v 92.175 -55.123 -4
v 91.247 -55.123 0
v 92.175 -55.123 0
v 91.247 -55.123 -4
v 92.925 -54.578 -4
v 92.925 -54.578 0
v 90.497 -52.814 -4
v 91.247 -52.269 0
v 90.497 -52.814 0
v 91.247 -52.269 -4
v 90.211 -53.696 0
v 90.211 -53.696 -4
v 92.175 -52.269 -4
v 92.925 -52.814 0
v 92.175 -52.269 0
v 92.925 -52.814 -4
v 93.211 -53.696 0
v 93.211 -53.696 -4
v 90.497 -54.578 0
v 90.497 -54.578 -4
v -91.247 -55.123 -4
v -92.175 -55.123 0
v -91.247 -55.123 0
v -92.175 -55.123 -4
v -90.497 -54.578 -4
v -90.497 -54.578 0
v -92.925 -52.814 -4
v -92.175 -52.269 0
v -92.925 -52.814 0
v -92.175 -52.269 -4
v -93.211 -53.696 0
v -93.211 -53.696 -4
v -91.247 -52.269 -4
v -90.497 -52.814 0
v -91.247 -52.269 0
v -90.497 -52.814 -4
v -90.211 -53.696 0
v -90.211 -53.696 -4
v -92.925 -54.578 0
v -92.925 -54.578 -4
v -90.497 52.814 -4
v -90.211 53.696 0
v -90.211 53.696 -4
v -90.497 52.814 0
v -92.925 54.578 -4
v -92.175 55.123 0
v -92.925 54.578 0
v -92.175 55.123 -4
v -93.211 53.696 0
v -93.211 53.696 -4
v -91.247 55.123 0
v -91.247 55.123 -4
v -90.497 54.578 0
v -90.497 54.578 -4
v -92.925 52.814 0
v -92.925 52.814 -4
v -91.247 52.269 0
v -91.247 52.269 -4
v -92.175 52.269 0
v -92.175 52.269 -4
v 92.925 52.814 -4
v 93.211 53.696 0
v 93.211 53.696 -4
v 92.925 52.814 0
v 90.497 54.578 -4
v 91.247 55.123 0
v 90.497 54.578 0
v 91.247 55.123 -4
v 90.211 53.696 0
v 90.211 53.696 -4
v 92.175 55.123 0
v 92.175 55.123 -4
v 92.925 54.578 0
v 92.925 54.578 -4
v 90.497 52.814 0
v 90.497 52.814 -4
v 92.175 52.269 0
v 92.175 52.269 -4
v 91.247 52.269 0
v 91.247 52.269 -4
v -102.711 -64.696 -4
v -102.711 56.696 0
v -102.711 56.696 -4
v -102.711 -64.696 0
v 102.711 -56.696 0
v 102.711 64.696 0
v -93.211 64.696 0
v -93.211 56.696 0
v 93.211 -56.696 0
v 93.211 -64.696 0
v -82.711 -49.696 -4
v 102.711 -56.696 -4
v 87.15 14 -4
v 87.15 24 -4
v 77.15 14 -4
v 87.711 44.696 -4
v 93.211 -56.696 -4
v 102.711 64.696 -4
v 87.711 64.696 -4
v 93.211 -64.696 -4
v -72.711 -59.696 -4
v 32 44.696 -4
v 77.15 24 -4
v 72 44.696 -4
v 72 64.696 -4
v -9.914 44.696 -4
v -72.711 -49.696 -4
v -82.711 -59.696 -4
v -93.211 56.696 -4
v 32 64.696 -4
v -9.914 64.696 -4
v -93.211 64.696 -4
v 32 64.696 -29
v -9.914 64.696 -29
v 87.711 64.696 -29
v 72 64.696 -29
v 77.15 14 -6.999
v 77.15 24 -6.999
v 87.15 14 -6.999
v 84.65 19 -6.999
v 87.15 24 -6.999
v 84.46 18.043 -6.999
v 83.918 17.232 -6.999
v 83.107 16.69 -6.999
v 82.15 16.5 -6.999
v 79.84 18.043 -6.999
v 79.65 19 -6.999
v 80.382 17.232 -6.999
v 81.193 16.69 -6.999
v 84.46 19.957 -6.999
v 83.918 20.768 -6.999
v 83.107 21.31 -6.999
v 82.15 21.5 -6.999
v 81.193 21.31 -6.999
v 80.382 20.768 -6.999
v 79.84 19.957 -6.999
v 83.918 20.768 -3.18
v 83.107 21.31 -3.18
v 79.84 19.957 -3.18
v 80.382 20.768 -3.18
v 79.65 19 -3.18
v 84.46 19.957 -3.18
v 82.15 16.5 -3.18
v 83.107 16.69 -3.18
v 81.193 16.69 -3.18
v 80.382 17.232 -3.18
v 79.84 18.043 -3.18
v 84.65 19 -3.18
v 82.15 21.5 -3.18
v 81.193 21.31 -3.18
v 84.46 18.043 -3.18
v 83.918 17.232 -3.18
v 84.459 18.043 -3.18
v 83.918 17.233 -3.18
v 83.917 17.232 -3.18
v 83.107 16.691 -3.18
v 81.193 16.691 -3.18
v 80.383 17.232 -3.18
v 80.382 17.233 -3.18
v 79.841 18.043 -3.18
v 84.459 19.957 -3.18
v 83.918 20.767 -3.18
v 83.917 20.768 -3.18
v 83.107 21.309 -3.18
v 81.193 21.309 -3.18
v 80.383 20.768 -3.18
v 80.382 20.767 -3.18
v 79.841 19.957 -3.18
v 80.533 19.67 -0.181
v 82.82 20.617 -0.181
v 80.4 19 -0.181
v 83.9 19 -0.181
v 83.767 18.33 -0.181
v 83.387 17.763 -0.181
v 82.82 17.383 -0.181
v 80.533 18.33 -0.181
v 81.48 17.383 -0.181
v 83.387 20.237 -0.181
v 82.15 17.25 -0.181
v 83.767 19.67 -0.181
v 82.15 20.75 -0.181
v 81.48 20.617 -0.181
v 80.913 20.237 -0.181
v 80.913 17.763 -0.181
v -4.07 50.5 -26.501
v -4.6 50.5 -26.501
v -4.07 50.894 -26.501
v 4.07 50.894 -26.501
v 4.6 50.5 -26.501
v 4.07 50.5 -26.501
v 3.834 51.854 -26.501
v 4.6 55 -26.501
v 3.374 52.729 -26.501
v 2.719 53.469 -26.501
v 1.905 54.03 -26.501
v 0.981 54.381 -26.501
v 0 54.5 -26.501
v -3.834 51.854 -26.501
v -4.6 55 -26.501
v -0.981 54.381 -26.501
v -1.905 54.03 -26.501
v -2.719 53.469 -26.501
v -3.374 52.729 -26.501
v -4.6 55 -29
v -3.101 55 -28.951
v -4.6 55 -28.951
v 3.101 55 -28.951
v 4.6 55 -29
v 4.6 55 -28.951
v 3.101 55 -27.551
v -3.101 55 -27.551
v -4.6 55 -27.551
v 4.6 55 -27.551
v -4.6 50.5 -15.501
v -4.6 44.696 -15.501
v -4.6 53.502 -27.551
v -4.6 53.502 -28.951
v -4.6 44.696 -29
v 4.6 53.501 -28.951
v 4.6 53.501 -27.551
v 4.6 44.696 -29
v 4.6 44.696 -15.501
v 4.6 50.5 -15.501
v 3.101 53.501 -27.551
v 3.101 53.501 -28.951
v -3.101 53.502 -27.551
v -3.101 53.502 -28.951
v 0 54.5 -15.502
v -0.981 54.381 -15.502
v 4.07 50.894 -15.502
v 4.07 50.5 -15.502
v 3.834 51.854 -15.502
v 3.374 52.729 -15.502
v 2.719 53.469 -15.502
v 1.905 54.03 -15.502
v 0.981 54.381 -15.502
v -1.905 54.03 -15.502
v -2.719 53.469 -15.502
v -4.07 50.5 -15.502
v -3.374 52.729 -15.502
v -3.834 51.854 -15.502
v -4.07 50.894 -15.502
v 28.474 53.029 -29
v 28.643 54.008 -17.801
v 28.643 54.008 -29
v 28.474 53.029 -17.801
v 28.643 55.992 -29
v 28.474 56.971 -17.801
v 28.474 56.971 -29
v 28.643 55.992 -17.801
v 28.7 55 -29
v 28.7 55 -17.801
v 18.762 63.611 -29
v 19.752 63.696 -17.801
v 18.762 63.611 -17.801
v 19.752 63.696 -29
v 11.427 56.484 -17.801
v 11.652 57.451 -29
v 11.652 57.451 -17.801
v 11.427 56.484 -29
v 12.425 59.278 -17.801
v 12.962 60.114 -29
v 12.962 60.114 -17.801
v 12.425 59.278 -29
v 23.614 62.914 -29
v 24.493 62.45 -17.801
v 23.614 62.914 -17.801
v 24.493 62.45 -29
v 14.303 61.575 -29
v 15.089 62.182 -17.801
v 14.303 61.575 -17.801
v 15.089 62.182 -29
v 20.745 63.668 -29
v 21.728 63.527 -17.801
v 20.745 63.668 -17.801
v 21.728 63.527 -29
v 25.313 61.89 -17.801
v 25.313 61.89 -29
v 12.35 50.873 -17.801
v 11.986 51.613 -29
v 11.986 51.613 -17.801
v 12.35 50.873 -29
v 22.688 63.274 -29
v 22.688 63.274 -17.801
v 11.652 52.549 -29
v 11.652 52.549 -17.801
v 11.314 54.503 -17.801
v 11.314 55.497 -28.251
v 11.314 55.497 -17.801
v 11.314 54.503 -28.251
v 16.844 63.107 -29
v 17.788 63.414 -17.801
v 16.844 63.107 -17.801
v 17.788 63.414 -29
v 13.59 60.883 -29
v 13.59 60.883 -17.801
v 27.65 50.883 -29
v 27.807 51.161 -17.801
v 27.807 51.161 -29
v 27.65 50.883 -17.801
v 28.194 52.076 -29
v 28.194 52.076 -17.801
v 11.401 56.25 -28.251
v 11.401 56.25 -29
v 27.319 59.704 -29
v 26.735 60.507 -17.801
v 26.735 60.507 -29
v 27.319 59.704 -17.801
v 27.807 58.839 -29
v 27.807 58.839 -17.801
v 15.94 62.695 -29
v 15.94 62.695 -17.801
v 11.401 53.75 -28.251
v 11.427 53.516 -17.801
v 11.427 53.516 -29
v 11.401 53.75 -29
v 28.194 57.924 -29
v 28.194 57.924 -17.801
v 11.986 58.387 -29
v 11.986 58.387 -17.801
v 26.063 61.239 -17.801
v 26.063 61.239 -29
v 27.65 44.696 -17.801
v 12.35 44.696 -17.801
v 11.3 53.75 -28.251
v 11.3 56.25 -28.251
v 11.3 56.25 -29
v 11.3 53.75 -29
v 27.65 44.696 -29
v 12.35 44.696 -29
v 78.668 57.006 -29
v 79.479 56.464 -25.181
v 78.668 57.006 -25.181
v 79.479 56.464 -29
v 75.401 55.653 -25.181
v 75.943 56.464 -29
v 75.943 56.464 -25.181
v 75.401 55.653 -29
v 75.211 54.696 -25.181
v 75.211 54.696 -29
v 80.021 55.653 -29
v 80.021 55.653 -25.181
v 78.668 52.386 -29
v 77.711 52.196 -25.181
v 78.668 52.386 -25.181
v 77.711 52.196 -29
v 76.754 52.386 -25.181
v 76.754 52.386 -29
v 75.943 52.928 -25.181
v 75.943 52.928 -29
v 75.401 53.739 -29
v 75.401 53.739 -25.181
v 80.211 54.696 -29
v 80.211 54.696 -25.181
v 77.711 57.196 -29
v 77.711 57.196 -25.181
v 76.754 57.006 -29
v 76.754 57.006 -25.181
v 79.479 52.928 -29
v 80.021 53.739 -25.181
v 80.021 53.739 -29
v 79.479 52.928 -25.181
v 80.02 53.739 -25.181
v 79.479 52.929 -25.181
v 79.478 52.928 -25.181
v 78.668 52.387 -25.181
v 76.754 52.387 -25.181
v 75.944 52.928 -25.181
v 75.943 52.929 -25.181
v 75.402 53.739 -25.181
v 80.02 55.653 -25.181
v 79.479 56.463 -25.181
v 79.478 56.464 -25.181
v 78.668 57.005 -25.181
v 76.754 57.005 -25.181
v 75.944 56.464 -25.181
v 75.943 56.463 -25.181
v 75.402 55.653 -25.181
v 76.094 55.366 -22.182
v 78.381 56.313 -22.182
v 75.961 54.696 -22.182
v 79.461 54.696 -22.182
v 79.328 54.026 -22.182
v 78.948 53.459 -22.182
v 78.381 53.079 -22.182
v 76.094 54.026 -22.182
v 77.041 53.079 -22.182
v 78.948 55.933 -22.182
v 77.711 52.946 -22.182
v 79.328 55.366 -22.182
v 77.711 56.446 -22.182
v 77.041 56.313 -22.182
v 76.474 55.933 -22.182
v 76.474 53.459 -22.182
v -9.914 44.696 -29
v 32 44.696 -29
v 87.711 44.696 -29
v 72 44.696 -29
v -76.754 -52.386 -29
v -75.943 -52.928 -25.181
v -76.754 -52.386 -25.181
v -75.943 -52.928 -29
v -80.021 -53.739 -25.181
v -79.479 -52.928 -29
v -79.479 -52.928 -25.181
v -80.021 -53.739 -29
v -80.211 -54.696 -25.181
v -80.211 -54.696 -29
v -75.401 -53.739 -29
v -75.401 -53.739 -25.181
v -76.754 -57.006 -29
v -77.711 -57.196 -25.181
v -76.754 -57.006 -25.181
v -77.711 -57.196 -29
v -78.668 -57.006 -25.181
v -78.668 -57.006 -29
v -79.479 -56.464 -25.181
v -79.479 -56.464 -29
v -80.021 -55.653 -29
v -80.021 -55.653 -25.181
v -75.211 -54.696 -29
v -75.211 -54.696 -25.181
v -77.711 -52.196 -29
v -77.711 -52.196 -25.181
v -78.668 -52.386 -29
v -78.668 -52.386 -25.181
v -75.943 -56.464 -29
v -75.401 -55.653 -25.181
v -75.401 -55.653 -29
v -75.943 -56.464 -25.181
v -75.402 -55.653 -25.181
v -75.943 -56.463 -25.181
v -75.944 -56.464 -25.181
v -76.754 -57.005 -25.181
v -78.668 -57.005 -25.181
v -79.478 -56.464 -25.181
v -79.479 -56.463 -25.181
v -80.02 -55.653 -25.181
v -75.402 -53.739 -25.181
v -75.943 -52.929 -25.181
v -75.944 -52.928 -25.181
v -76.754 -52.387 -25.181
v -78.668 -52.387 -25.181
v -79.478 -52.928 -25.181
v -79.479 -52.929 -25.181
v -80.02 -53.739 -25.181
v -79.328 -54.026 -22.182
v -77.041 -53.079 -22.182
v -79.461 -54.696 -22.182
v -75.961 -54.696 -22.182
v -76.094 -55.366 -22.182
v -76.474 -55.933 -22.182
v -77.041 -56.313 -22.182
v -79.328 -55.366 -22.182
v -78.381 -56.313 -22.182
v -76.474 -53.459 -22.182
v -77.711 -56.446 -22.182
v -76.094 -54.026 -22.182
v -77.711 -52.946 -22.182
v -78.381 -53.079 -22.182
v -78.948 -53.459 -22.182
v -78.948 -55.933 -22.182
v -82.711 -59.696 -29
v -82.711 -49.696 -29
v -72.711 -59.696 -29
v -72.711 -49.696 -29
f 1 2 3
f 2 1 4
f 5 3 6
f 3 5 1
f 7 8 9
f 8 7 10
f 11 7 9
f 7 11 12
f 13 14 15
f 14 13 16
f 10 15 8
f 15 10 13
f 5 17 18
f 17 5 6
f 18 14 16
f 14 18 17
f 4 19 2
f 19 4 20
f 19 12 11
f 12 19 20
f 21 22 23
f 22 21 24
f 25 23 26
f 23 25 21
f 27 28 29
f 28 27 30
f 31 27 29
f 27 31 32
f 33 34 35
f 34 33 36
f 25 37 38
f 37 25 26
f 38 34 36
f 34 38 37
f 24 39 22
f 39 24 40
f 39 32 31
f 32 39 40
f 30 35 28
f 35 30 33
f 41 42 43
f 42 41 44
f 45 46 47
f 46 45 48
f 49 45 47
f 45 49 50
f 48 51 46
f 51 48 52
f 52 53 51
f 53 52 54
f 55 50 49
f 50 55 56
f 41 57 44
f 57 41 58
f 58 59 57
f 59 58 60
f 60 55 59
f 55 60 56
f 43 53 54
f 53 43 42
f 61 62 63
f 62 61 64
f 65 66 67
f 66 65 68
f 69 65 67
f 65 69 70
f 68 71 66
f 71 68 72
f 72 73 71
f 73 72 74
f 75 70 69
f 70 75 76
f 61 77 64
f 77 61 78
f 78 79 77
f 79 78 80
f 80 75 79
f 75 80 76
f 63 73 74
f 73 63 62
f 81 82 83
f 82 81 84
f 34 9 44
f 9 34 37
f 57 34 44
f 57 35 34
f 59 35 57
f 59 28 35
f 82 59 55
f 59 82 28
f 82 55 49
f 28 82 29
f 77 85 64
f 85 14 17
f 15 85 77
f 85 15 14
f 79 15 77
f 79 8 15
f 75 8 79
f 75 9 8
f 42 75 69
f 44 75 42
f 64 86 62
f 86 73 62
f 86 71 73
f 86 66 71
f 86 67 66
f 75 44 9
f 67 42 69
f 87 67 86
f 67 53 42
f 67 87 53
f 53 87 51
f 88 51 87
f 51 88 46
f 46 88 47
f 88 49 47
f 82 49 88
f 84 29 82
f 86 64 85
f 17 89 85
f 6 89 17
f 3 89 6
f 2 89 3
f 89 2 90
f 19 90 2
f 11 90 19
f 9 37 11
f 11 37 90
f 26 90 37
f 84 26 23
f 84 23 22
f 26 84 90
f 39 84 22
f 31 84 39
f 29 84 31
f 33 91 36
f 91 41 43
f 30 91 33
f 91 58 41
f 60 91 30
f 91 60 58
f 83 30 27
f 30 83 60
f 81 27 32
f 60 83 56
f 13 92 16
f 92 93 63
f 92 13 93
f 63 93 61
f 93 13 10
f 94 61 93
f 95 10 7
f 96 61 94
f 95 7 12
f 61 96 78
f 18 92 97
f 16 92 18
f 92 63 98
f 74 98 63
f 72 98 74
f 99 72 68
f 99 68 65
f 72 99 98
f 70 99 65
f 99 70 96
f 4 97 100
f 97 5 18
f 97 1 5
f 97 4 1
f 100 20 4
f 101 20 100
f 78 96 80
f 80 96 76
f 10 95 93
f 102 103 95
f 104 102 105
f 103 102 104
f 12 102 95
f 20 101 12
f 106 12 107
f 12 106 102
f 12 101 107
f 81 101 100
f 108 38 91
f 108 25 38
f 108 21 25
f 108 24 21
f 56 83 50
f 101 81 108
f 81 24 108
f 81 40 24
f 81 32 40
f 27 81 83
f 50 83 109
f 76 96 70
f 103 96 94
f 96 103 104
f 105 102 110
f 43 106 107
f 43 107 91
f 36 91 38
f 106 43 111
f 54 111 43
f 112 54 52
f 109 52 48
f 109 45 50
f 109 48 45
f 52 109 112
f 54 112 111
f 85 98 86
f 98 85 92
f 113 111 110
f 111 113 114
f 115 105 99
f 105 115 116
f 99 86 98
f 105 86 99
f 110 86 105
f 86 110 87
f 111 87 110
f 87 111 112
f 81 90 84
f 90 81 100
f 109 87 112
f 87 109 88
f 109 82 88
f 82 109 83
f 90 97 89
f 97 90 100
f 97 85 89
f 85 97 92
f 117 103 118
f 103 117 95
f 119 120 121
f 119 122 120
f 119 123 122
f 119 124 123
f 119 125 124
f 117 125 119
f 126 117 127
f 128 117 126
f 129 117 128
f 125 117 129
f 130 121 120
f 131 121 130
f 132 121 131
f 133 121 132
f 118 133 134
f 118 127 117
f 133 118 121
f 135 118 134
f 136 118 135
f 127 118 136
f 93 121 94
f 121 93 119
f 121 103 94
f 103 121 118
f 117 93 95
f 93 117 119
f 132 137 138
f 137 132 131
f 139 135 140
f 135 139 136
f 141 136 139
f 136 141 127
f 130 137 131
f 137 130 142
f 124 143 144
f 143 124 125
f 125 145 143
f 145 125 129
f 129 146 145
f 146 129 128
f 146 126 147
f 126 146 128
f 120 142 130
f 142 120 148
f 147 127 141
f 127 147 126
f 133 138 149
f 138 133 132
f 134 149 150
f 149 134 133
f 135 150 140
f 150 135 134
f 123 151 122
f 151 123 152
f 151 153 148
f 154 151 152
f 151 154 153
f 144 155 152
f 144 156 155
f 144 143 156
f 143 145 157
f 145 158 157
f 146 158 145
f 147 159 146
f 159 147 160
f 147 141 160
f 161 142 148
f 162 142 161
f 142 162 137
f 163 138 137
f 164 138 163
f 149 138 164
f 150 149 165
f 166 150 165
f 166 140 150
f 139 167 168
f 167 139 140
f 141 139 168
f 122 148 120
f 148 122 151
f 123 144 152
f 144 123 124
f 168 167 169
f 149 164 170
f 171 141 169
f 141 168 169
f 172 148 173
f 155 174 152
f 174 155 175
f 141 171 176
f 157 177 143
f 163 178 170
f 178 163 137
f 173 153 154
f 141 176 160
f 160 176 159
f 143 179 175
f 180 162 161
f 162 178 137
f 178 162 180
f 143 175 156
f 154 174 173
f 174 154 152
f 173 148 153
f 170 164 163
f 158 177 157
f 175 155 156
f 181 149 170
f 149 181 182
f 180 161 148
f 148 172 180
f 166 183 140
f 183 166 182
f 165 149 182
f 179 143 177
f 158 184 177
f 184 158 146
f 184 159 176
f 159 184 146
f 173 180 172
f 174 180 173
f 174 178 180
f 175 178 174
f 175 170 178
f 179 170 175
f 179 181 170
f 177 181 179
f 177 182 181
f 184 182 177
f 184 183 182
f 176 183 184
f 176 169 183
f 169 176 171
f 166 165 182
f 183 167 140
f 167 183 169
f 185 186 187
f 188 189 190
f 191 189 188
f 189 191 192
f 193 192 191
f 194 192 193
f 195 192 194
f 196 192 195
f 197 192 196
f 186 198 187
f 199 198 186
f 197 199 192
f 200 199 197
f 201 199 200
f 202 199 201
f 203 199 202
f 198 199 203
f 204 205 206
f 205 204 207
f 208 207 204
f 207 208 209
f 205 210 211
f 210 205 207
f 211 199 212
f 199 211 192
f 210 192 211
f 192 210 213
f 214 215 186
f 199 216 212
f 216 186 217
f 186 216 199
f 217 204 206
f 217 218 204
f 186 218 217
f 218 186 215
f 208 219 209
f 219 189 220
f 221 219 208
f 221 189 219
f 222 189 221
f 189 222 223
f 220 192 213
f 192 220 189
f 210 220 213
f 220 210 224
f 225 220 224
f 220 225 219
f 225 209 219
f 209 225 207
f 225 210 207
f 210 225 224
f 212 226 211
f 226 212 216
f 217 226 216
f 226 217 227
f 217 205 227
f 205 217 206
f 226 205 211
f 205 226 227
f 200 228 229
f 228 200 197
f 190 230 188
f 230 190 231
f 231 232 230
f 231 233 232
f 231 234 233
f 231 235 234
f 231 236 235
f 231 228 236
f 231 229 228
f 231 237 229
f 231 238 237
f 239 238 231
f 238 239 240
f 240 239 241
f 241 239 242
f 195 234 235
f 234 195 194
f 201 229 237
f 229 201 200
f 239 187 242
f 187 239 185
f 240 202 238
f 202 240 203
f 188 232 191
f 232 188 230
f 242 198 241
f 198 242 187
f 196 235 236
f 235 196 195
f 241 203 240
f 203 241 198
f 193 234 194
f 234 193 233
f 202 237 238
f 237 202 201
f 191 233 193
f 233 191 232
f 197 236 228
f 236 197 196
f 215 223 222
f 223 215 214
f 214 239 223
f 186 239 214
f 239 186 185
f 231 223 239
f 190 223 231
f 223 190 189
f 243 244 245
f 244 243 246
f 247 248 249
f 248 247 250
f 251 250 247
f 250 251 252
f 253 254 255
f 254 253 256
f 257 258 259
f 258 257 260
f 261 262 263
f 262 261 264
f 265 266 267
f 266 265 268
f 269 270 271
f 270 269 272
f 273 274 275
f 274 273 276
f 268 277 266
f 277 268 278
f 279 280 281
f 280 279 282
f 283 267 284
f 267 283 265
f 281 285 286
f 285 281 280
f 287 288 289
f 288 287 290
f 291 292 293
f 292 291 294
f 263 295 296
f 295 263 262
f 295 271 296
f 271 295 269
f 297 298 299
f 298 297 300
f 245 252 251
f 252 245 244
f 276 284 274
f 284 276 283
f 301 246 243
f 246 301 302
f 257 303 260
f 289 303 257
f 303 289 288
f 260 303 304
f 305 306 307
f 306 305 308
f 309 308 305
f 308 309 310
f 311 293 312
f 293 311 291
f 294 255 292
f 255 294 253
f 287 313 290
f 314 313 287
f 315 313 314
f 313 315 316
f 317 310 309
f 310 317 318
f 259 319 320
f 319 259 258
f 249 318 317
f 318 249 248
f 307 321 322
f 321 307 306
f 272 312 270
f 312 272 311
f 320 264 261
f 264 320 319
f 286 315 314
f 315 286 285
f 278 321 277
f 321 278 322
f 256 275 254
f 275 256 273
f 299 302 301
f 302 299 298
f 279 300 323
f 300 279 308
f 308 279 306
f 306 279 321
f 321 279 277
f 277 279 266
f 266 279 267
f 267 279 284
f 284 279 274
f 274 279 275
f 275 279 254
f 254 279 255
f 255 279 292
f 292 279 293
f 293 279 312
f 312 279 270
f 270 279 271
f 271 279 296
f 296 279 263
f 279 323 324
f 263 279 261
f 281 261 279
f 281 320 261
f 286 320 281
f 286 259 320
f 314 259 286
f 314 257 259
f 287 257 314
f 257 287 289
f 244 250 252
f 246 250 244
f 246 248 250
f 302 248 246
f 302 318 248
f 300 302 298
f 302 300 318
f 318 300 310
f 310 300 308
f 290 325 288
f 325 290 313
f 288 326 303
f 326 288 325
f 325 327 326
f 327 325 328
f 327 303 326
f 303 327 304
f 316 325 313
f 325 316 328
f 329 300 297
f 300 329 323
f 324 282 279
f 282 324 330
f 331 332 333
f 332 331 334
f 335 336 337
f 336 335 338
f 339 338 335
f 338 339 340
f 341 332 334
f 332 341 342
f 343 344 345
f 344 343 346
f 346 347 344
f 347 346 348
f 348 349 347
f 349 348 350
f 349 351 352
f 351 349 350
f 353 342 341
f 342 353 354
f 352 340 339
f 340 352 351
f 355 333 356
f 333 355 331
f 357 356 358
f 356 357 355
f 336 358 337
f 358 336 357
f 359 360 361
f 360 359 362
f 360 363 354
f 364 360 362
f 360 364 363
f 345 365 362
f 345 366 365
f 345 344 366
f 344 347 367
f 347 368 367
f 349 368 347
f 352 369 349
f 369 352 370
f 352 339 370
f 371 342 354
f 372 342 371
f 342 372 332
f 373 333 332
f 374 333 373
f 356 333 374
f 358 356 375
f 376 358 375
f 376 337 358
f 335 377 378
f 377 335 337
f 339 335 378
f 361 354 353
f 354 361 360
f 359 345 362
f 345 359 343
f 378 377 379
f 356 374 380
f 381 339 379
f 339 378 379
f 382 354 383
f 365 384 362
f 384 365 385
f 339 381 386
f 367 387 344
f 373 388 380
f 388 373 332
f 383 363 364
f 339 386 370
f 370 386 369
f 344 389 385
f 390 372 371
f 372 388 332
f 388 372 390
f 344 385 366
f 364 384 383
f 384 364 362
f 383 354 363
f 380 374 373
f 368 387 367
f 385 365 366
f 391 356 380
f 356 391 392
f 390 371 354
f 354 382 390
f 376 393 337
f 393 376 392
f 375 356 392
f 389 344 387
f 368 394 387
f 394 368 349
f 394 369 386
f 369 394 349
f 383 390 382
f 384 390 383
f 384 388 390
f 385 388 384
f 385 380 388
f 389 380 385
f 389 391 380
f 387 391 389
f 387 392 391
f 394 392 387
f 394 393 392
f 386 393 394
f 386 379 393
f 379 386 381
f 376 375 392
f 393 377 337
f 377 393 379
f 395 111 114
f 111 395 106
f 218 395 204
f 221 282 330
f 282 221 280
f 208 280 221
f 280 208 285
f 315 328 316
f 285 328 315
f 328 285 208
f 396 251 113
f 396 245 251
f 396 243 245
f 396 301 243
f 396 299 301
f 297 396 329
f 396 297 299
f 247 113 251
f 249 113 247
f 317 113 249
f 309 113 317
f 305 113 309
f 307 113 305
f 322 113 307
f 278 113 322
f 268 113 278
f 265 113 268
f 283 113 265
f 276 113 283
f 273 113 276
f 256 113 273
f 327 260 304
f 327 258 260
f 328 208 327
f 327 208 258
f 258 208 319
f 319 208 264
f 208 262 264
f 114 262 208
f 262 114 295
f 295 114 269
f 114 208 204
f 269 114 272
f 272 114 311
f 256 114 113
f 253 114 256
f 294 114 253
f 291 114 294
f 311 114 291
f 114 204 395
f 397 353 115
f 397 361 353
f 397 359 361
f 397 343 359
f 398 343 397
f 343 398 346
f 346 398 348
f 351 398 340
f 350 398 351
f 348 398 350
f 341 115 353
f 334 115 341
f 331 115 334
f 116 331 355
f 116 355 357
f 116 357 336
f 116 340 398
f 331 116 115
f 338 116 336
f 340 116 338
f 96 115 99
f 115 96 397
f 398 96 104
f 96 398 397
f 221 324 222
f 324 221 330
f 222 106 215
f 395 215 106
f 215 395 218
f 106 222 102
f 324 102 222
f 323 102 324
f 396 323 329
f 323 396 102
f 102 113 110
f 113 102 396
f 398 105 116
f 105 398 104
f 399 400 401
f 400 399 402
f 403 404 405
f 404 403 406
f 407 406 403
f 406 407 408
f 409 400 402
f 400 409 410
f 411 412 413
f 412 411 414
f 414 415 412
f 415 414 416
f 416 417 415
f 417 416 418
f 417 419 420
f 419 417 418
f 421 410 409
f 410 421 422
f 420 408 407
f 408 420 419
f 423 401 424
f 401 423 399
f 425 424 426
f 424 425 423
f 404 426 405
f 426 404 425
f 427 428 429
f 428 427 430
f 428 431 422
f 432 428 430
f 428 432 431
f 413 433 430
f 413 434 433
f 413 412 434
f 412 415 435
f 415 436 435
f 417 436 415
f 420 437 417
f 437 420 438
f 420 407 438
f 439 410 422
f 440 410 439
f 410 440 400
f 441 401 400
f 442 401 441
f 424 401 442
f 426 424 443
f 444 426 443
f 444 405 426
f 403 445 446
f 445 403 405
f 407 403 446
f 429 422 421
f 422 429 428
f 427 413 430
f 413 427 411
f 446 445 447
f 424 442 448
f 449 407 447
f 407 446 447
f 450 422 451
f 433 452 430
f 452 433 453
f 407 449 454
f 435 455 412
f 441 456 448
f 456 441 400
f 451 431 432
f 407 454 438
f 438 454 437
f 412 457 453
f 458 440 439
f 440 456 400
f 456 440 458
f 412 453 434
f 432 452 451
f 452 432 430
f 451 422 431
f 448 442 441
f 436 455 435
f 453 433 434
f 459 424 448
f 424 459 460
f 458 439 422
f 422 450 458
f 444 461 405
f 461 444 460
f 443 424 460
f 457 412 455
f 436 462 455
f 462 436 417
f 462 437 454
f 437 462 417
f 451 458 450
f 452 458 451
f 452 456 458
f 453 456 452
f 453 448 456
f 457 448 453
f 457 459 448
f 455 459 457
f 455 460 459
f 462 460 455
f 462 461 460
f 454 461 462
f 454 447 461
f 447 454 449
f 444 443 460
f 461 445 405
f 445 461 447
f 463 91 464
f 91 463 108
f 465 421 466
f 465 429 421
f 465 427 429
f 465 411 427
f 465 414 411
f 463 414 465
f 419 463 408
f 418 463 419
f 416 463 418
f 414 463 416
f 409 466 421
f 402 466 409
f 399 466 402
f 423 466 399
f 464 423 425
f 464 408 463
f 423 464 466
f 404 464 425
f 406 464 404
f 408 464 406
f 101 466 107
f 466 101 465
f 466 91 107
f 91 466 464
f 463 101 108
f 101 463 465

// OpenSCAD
// file: ../pills/m3_insert.scad
module m3_insert() {
    translate([0, 0, -3.82/2])
        difference() {
            cylinder(h=3.82, r=2.5, center=true);
            cylinder(h = 4, r = 1.5, center=true);
        }
}

m3_insert();
// file: ../pills/switch_pot.scad
base_radius = 17.4/2;
base_width = 15.3;
thickness = 11.2;
pin_sides = 2.5;
pin_thickness = 1;
shaft_radius= 7/2;
shaft_height=15;
thread_height=6.5;

$fs=1;
$fa=0.4;
module switch_pot() {
    translate([0, 0, -thickness/2])
        cylinder(h=thickness, r=base_radius, center=true);
    translate([-base_radius+pin_thickness/2, 0, pin_thickness/2])
        cube([pin_thickness, pin_sides, pin_sides], center=true);
    translate([0, -base_width/2, -thickness/2])
        cube([base_width, base_width/2, thickness], center=true);
    translate([0, 0, shaft_height/2])
        cylinder(h=shaft_height, r=shaft_radius, center=true);
}

switch_pot();
// file: ../pills/power_connector.scad
$fs=1;
$fa=0.4;

width = 9.2;
height = 11;
depth = 14.5;

barrel_radius = 4.1;
barrel_top_offset = 0.5;

plate_thickness = 3.5;

bottom_depth = 14.5;

module power_connector() {
    difference() {
        translate([-plate_thickness/2, 0, -height/2])
            cube([plate_thickness, width, height], center=true);
        translate([-plate_thickness/2, -width/2+1.5/2-0.001, -1.5/2+0.001])
            cube([1.4, 1.5, 1.5], center=true);
        translate([-plate_thickness/2, +width/2-1.5/2+0.001, -1.5/2+0.002])
            cube([1.4, 1.5, 1.5], center=true);
    }
    translate([(depth-plate_thickness)/2-0.001, 0, -barrel_radius-barrel_top_offset])
        rotate([0, 90, 0])
        cylinder(h=depth-plate_thickness, r=barrel_radius, center=true);
    translate([bottom_depth/2-plate_thickness, 0, -height/2-(height-6.5)/2])
        cube([bottom_depth, width, 6.5], center=true);
    translate([bottom_depth/2-0.25, 0, -height/2-(height-6.5)/2-5])
        cube([8, width, 6], center=true);
}

power_connector();
// file: ../pills/electronics.scad
use <dimensions.scad>

hole_inset = 3.5;
module electronics() {
    translate([0, 0, -electronics_thickness()/2-3])
    difference() {
        cube([electronics_width(), electronics_height(), electronics_thickness()], center=true);
        translate([-electronics_width()/2 + hole_inset, 0, 0])
        cylinder(h=electronics_thickness()*2, r=1.5, center=true);
    }
}

electronics();
// file: ../pills/negative_insert.scad
use <m3_insert.scad>

module negative_insert() {
    $fs=1;
    $fa=0.4;

    translate([0, 0, 3.82])
    union() {
        translate([0, 0, -(3.82/2)])
        cylinder(h=3.82, r=2.5, center=true);
        translate([0, 0, -0.001])
        linear_extrude(height=3, scale=0.7)
        circle(r=2.5);
    }
}

negative_insert();
// file: ../pills/negative_screw.scad
use <dimensions.scad>

thickness = 3;
module negative_screw() {
    translate([-plate_width()/2 + hole_offset(), -plate_height()/2 + hole_offset(), 0])
        cylinder(h = thickness * 2, r = hole_radius(), center=true);
    translate([plate_width()/2 - hole_offset(), -plate_height()/2 + hole_offset(), 0])
        cylinder(h = thickness * 2, r = hole_radius(), center=true);
    translate([plate_width()/2 - hole_offset(), plate_height()/2 - hole_offset(), 0])
        cylinder(h = thickness * 2, r = hole_radius(), center=true);
    translate([-plate_width()/2 + hole_offset(), plate_height()/2 - hole_offset(), 0])
        cylinder(h = thickness * 2, r = hole_radius(), center=true);
}

negative_screw();
// file: ../pills/dimensions.scad
function plate_width() = 193.422;
function plate_height() = 117.392;
function plate_thickness() = 3;
function separation() = 5;
function led_width() = 10;
function led_height() = 2.5;
function hole_radius() = 1.5;
function hole_offset() = 3.5 + hole_radius();
function separator_thickness() = (led_width()-plate_thickness())/2;

function electronics_width() = 81.3;
function electronics_height() = 50.7;
function electronics_thickness() = 23;
// main file
use <../pills/dimensions.scad>
use <../pills/negative_screw.scad>
use <../pills/negative_insert.scad>
use <../pills/electronics.scad>
use <../pills/power_connector.scad>
use <../pills/switch_pot.scad>

$fs=1;
$fa=0.4;

thickness=4;
support_length=electronics_thickness()+2;
elec_offset_x = -45;
elec_offset_y = 19;
elec_offset_z = 0;

back_plate_width = plate_width() + 12;
back_plate_height = plate_height() + 12;

mounting_length = electronics_width() * 1.25-4;
mounting_width = 20;
mounting_inset = 15;

module back_plate() {
    translate([0, 0, -thickness/2])
    difference() {
        union() {
            translate([-electronics_width()/2+elec_offset_x+3.5, 19, -thickness/2-1.5+0.001])
                cube([10, 10, 3], center=true);
            difference() {
                cube([back_plate_width, back_plate_height, thickness], center=true);
                scale([1, 1, 3])
                    negative_screw();
                translate([
                        (plate_width() + led_height() * 2)/2, (plate_height() + led_height() * 2)/2 + 1.5, 0])
                    cube([
                        thickness*3, thickness*3, thickness*3
                    ], center=true);
                translate([
                        -(plate_width() + led_height() * 2)/2, -(plate_height() + led_height() * 2)/2 - 1.5, 0])
                    cube([
                        thickness*3, thickness*3, thickness*3
                    ], center=true);
            }
        }
        translate([-electronics_width()/2+elec_offset_x+3.5, 19, -thickness])
            translate([0, 0, -1])
            negative_insert();
    }
    difference() {
        translate([-back_plate_width/2+mounting_length/2+mounting_inset, back_plate_height/2-mounting_width/2, -thickness-support_length/2])
            cube([mounting_length, mounting_width, support_length], center=true);
        translate([0, 55, -support_length-1.501])
            rotate([0, 270, 270])
            power_connector();
        translate([-20, 55, -support_length -4.001])// -29.001])
            rotate([180, 0, 180])
            switch_pot();
        translate([-52, 55, -support_length])
            cube([40, 30, 50], center=true);
        translate([-back_plate_width/2+10+mounting_inset, back_plate_height/2 - mounting_width/2, -support_length-thickness-0.001])
            negative_insert();
    }
    difference() {
        translate([back_plate_width/2-10-mounting_inset, -back_plate_height/2 + mounting_width/2, -thickness-support_length/2])
            cube([10, 10, support_length], center=true);
        translate([back_plate_width/2-10-mounting_inset,-back_plate_height/2 + mounting_width/2, -support_length-thickness-0.001])
            negative_insert();
    }
}

scale([-1, 1, 1])
back_plate();

// color([1, 0, 0, 0.3])
// translate([elec_offset_x, elec_offset_y, elec_offset_z])
// electronics();
